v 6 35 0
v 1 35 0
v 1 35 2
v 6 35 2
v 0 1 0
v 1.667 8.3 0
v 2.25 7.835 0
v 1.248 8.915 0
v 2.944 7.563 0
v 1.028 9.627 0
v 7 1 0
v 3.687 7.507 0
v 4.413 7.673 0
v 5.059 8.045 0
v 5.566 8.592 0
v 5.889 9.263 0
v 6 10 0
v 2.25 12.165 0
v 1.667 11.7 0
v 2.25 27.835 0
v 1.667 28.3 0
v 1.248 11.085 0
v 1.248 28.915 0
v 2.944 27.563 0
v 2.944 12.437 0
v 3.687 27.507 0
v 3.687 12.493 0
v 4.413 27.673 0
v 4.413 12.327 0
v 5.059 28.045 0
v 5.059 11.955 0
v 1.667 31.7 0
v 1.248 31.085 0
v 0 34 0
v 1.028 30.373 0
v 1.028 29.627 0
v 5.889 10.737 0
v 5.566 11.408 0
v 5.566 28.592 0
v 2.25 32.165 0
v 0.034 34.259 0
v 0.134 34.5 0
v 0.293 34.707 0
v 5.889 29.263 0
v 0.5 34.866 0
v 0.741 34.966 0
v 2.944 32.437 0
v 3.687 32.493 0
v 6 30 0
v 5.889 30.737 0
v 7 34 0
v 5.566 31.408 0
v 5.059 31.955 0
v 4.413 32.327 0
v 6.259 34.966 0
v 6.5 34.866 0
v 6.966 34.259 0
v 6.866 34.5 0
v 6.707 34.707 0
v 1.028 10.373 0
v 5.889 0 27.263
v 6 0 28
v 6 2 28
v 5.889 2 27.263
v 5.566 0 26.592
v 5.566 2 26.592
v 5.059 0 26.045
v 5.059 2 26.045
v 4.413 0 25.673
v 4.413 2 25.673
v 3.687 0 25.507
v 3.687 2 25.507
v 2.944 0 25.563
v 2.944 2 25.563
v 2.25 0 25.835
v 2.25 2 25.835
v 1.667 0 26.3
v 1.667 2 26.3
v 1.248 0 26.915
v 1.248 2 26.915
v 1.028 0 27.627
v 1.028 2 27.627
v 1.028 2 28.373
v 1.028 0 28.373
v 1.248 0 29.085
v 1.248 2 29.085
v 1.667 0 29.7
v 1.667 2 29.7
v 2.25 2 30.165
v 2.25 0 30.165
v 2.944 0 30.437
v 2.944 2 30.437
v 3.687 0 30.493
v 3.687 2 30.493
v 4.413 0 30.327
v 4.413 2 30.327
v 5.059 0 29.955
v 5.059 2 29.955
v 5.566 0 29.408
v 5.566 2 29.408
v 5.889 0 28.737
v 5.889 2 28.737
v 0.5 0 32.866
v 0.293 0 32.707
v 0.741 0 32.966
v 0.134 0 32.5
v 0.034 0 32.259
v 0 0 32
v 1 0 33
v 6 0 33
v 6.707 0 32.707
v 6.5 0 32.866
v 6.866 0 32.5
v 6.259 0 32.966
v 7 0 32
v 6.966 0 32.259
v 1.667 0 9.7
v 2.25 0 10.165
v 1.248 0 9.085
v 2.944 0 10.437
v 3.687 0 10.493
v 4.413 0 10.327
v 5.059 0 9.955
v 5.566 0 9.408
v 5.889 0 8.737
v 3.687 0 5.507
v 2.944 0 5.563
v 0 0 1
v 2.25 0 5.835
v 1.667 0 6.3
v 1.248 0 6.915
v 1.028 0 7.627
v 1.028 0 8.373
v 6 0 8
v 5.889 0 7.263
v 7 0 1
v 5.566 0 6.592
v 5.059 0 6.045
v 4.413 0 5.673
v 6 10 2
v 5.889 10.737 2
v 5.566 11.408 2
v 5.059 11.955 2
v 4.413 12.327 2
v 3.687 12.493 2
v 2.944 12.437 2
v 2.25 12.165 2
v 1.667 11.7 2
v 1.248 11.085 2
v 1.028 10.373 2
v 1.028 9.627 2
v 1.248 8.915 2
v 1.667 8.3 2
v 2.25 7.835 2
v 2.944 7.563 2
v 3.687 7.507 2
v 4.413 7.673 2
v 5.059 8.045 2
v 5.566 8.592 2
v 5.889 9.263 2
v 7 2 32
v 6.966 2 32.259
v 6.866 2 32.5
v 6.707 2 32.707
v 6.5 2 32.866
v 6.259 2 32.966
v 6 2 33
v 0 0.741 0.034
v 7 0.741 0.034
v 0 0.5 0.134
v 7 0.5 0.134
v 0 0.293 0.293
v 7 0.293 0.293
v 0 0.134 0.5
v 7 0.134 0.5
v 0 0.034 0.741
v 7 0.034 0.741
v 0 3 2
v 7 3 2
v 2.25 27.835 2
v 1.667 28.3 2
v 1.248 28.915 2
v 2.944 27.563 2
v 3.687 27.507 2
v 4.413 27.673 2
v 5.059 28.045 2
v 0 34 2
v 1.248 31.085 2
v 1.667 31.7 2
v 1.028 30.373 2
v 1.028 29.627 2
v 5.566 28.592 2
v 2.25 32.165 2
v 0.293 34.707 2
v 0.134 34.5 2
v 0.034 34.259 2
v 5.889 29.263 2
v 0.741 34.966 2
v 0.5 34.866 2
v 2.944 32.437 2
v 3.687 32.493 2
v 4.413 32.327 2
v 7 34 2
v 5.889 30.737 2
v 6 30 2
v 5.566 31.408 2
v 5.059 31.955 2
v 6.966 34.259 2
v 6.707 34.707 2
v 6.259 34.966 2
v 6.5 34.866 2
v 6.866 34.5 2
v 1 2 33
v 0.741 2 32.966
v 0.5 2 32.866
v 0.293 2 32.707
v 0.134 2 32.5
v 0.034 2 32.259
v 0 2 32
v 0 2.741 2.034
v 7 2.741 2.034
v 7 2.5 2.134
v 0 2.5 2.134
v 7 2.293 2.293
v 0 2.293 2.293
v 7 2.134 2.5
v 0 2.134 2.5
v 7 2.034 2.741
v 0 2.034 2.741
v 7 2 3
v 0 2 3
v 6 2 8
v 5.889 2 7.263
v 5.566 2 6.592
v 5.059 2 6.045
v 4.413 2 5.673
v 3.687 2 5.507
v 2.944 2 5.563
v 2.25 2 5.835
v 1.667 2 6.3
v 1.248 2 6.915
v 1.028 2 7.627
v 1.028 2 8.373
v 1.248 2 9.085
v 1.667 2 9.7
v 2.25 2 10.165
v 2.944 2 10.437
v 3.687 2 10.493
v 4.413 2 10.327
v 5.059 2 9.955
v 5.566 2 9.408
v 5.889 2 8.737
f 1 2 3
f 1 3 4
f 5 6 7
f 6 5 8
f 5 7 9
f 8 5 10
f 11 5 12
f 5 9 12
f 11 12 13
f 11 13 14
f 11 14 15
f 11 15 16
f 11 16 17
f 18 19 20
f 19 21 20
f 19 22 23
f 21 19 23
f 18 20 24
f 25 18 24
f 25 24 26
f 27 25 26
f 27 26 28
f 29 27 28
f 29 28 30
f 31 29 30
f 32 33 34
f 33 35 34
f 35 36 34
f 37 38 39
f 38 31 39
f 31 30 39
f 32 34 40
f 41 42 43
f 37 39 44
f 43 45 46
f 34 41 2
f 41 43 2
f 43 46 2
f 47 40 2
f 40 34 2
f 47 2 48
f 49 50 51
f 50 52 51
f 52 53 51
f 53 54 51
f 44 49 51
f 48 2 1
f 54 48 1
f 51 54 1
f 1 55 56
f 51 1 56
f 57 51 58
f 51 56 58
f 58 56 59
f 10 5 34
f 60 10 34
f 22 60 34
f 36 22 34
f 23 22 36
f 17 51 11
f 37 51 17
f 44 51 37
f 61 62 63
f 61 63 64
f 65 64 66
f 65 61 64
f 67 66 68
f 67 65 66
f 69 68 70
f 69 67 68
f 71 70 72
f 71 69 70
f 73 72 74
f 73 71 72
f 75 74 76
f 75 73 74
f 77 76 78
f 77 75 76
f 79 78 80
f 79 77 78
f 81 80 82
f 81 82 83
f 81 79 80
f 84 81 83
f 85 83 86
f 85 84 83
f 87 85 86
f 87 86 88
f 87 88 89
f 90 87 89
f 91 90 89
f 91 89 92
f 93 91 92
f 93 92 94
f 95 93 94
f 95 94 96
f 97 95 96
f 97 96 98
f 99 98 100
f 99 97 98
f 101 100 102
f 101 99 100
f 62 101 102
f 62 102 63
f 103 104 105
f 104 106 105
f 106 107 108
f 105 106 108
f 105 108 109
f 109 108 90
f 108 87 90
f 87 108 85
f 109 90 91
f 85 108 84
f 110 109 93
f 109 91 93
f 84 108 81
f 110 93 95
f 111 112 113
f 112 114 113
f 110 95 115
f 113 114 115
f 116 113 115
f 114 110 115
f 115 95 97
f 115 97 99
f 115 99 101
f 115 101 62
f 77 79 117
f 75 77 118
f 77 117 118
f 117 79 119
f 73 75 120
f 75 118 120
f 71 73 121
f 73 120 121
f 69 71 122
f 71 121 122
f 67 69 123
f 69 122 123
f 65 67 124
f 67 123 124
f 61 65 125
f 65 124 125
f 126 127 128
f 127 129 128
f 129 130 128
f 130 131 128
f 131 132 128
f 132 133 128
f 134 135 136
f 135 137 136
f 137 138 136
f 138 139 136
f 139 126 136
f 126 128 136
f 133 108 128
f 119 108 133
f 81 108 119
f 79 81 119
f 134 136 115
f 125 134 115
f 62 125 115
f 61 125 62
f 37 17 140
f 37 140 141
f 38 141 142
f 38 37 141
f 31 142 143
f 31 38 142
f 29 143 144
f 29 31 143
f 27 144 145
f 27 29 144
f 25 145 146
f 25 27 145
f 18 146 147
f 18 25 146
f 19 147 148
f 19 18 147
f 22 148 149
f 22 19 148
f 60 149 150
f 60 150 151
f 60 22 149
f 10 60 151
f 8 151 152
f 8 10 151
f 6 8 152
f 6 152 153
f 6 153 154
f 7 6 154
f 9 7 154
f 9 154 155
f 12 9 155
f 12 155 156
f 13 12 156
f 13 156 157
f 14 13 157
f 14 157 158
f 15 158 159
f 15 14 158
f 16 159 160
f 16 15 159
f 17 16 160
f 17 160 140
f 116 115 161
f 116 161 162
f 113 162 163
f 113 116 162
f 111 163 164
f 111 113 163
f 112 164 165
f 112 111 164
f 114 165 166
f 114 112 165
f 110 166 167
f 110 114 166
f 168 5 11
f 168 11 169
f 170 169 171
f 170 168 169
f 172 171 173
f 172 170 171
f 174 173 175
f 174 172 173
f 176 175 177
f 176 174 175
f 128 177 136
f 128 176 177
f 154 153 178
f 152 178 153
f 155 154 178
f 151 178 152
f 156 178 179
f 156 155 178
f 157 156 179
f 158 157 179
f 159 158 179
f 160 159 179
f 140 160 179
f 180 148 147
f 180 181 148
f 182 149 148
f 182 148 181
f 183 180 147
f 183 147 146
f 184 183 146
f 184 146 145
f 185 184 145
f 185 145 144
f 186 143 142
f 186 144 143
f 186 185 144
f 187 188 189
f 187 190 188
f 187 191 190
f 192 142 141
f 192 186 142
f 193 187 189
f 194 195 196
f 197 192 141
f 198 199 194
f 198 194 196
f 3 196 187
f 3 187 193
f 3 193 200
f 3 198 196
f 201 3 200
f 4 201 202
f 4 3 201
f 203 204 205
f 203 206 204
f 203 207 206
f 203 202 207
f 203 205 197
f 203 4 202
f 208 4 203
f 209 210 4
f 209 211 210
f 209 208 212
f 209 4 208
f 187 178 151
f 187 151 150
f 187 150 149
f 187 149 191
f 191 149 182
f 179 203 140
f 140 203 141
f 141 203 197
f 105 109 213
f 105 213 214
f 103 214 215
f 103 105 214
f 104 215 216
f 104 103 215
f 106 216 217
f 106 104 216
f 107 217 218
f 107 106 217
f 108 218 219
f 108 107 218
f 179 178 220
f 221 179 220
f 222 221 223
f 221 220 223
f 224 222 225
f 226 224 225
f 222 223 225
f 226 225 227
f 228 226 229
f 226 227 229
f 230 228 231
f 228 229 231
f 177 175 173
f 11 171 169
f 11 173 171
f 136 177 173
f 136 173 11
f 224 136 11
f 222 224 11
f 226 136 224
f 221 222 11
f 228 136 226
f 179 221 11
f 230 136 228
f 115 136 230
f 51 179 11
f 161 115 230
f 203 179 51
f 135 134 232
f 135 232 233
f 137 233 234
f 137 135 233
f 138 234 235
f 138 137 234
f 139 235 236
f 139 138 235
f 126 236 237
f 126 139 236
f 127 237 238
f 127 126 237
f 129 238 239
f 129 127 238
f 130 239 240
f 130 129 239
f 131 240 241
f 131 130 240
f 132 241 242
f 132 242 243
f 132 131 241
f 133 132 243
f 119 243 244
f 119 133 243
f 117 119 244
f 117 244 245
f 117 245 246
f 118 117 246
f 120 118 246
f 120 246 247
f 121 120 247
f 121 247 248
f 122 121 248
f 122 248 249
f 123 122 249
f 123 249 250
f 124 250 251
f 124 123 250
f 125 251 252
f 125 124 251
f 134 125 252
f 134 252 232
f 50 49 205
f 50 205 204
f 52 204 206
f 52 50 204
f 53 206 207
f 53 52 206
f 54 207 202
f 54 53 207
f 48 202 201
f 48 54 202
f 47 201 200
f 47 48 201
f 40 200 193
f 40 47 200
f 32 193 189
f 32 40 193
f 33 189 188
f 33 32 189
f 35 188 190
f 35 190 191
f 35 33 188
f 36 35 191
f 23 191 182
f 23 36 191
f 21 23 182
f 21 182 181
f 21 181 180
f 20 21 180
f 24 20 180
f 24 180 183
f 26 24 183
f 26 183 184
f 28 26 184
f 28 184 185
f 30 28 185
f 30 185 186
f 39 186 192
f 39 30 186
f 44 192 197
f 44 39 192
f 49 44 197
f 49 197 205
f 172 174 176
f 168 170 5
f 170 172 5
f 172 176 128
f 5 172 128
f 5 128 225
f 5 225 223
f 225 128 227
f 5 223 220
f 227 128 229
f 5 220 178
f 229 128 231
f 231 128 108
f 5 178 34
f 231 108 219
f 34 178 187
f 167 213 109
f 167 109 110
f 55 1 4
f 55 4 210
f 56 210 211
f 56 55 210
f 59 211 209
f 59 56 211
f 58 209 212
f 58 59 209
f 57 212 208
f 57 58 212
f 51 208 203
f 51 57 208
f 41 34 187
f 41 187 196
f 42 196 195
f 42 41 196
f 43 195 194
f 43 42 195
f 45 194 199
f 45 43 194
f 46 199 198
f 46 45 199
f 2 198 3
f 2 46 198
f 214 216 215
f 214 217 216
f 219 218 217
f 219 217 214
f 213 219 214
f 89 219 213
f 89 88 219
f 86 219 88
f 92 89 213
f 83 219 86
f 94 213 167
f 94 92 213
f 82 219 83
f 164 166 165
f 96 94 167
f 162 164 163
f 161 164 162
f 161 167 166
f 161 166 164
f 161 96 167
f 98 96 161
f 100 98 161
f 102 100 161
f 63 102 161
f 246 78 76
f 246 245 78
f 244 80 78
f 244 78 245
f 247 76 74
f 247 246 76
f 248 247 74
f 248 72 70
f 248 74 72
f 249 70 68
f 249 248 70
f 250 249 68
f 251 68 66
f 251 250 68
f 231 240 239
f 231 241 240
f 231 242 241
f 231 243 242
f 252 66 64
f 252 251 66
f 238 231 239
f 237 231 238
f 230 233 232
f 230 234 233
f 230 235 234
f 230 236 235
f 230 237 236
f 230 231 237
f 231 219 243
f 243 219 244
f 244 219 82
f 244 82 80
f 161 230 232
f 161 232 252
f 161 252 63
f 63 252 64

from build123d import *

# Parameters (mm, degrees)
ESQUISSE1_W        = 7
ESQUISSE1_H        = 33
ESQUISSE1_R        = 2.5
BOSS_EXTRU_1_DEPTH = 2
ESQUISSE1_3_W      = 7
ESQUISSE1_3_H      = 2
BOSS_EXTRU_2_DEPTH = 33
CONG_2_DEPTH       = 7
CONG_2_2_OUTLINE_R = 2.5
CONG_2_2_DEPTH     = 2
CONG_2_START       = -1
CONG_2_3_DEPTH     = 4
CONG_2_4_DEPTH     = 9


with BuildPart() as part:
    # Esquisse1 → Boss.-Extru.1 (new body)
    with BuildSketch(Plane.XY):
        with Locations((3.5, 18.5)):
            Rectangle(ESQUISSE1_W, ESQUISSE1_H)
        with Locations((3.5, 10)):
            Circle(ESQUISSE1_R, mode=Mode.SUBTRACT)
        with Locations((3.5, 30)):
            Circle(ESQUISSE1_R, mode=Mode.SUBTRACT)
    extrude(amount=BOSS_EXTRU_1_DEPTH)

    # Esquisse1<3> → Boss.-Extru.2 (add)
    with BuildSketch(Plane.XY):
        with Locations((3.5, 1)):
            Rectangle(ESQUISSE1_3_W, ESQUISSE1_3_H)
    extrude(amount=BOSS_EXTRU_2_DEPTH)

    # Congé2: read off the stored shape, not the designer's step
    # Congé2 outline → Congé2 (add)
    with BuildSketch(Plane.YZ):
        with BuildLine():
            Line((2, 2), (3, 2))
            ThreePointArc((3, 2), (2.292893219, 2.292893219), (2, 3))
            Line((2, 3), (2, 2))
        make_face()
    extrude(amount=CONG_2_DEPTH)

    # Cong_2 2 outline → Cong_2 2 (cut)
    with BuildSketch(Plane(origin=(0, 0, 0), x_dir=(1, 0, 0), z_dir=(0, 1, 0))):
        with Locations((3.5, -8)):
            Circle(CONG_2_2_OUTLINE_R)
        with Locations((3.5, -28)):
            Circle(CONG_2_2_OUTLINE_R)
        with BuildLine():
            Line((7, -33), (7, -32))
            ThreePointArc((7, -32), (6.707106781, -32.707106781), (6, -33))
            Line((6, -33), (7, -33))
        make_face()
        with BuildLine():
            Line((0, -33), (1, -33))
            ThreePointArc((1, -33), (0.292893219, -32.707106781), (0, -32))
            Line((0, -32), (0, -33))
        make_face()
    extrude(amount=CONG_2_2_DEPTH, mode=Mode.SUBTRACT)

    # Cong_2 3 outline → Cong_2 3 (cut)
    with BuildSketch(Plane.XY.offset(CONG_2_START)):
        with BuildLine():
            ThreePointArc((0, 34), (0.292893219, 34.707106781), (1, 35))
            Line((1, 35), (0, 35))
            Line((0, 35), (0, 34))
        make_face()
        with BuildLine():
            ThreePointArc((6, 35), (6.707106781, 34.707106781), (7, 34))
            Line((7, 34), (7, 35))
            Line((7, 35), (6, 35))
        make_face()
    extrude(amount=CONG_2_3_DEPTH, mode=Mode.SUBTRACT)

    # Cong_2 4 outline → Cong_2 4 (cut)
    with BuildSketch(Plane.YZ.offset(CONG_2_START)):
        with BuildLine():
            ThreePointArc((1, 0), (0.292893219, 0.292893219), (0, 1))
            Line((0, 1), (0, 0))
            Line((0, 0), (1, 0))
        make_face()
    extrude(amount=CONG_2_4_DEPTH, mode=Mode.SUBTRACT)


solid = part.part
